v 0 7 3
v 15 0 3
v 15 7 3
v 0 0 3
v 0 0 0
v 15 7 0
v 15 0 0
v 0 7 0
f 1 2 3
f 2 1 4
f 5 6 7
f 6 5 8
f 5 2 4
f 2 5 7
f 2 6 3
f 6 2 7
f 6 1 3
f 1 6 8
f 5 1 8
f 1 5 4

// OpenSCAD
// Generated by SolidPython 1.0.1 on 2020-07-29 00:46:55


cube(size = [15, 7, 3]);
/***********************************************
*********      SolidPython code:      **********
************************************************
 
# import packages: SolidPython
from solid import *
from solid.utils import *
from itertools import chain, combinations, permutations


class Resize:

    def __init__(self, scad_file):
        self.scad_file = scad_file
        #self.scad_file = import_scad(scad_file)
        # cone/cylinder param:
        self.r1 = 0
        self.r2 = 0
        self.h = 0
        # rectangular prism param:
        self.w = 0
        self.l = 0
        # ellipse param:
        self.r = 0

    # import OpenScad code (file name corresponds to shape)


    # classify shape + parameters
    def assign(self, param1, param2, param3):
        if self.scad_file == 'cone.scad':
            self.r1 = param1
            self.r2 = param2
            self.h = param3
        elif self.scad_file == 'cylinder.scad':
            self.r1 = param1
            self.r2 = param2
            self.h = param3
        elif self.scad_file == 'rectangularPrism.scad':
            self.h = param1
            self.l = param2
            self.w = param3
        else:
            self.r = param1
            self.h = param2

    # resize parameters
    def iterate(self):
        x = range(3, 20, 2)
        i = 1
        if self.scad_file == 'cone.scad':
            tempList = list(permutations(x, 2))
            for temp in tempList:
                param1 = temp[0]
                param2 = temp[1]
                filepath = 'produced_scad_files/' + 'cone' + str(param1) + '_' + str(param2) + '_' + '.scad'
                scad_render_to_file(cylinder(h=param1, r1=param2, r2=0), filepath)

        elif self.scad_file == 'cylinder.scad':
            tempList = list(permutations(x, 3))
            for temp in tempList:
                param1 = temp[0]
                param2 = temp[1]
                filepath = 'produced_scad_files/' + 'cylinder' + str(param1) + '_' + str(param2) + '_' + '.scad'
                scad_render_to_file(cylinder(h=param1, r1=param2, r2=param2), filepath)

        elif self.scad_file == 'rectangularPrism.scad':
            tempList = list(permutations(x, 3))
            for temp in tempList:
                param1 = temp[0]
                param2 = temp[1]
                param3 = temp[2]
                filepath = 'produced_scad_files/' + 'rectangularPrism' + str(param1) + '_' + str(param2) + '_' + str(
                    param3) + '.scad'
                scad_render_to_file(cube(size=(param1, param2, param3)), filepath)

        elif self.scad_file == 'ellipse.scad':
            tempList = list(permutations(x, 4))
            for temp in tempList:
                param1 = temp[0]
                param2 = temp[1]
                param3 = temp[2]
                param4 = temp[3]
                filepath = 'produced_scad_files/' + 'ellipse' + str(param1) + '_' + str(param2) + '_' + str(param3) + '_' + str(param4) + '.scad'
                scad_render_to_file(scale([param1, param2, param3])(sphere(r=param4)), filepath)

    def render_to_scadfile(self):
        scad_render_to_file(scad, 'example.scad') 
 
************************************************/
